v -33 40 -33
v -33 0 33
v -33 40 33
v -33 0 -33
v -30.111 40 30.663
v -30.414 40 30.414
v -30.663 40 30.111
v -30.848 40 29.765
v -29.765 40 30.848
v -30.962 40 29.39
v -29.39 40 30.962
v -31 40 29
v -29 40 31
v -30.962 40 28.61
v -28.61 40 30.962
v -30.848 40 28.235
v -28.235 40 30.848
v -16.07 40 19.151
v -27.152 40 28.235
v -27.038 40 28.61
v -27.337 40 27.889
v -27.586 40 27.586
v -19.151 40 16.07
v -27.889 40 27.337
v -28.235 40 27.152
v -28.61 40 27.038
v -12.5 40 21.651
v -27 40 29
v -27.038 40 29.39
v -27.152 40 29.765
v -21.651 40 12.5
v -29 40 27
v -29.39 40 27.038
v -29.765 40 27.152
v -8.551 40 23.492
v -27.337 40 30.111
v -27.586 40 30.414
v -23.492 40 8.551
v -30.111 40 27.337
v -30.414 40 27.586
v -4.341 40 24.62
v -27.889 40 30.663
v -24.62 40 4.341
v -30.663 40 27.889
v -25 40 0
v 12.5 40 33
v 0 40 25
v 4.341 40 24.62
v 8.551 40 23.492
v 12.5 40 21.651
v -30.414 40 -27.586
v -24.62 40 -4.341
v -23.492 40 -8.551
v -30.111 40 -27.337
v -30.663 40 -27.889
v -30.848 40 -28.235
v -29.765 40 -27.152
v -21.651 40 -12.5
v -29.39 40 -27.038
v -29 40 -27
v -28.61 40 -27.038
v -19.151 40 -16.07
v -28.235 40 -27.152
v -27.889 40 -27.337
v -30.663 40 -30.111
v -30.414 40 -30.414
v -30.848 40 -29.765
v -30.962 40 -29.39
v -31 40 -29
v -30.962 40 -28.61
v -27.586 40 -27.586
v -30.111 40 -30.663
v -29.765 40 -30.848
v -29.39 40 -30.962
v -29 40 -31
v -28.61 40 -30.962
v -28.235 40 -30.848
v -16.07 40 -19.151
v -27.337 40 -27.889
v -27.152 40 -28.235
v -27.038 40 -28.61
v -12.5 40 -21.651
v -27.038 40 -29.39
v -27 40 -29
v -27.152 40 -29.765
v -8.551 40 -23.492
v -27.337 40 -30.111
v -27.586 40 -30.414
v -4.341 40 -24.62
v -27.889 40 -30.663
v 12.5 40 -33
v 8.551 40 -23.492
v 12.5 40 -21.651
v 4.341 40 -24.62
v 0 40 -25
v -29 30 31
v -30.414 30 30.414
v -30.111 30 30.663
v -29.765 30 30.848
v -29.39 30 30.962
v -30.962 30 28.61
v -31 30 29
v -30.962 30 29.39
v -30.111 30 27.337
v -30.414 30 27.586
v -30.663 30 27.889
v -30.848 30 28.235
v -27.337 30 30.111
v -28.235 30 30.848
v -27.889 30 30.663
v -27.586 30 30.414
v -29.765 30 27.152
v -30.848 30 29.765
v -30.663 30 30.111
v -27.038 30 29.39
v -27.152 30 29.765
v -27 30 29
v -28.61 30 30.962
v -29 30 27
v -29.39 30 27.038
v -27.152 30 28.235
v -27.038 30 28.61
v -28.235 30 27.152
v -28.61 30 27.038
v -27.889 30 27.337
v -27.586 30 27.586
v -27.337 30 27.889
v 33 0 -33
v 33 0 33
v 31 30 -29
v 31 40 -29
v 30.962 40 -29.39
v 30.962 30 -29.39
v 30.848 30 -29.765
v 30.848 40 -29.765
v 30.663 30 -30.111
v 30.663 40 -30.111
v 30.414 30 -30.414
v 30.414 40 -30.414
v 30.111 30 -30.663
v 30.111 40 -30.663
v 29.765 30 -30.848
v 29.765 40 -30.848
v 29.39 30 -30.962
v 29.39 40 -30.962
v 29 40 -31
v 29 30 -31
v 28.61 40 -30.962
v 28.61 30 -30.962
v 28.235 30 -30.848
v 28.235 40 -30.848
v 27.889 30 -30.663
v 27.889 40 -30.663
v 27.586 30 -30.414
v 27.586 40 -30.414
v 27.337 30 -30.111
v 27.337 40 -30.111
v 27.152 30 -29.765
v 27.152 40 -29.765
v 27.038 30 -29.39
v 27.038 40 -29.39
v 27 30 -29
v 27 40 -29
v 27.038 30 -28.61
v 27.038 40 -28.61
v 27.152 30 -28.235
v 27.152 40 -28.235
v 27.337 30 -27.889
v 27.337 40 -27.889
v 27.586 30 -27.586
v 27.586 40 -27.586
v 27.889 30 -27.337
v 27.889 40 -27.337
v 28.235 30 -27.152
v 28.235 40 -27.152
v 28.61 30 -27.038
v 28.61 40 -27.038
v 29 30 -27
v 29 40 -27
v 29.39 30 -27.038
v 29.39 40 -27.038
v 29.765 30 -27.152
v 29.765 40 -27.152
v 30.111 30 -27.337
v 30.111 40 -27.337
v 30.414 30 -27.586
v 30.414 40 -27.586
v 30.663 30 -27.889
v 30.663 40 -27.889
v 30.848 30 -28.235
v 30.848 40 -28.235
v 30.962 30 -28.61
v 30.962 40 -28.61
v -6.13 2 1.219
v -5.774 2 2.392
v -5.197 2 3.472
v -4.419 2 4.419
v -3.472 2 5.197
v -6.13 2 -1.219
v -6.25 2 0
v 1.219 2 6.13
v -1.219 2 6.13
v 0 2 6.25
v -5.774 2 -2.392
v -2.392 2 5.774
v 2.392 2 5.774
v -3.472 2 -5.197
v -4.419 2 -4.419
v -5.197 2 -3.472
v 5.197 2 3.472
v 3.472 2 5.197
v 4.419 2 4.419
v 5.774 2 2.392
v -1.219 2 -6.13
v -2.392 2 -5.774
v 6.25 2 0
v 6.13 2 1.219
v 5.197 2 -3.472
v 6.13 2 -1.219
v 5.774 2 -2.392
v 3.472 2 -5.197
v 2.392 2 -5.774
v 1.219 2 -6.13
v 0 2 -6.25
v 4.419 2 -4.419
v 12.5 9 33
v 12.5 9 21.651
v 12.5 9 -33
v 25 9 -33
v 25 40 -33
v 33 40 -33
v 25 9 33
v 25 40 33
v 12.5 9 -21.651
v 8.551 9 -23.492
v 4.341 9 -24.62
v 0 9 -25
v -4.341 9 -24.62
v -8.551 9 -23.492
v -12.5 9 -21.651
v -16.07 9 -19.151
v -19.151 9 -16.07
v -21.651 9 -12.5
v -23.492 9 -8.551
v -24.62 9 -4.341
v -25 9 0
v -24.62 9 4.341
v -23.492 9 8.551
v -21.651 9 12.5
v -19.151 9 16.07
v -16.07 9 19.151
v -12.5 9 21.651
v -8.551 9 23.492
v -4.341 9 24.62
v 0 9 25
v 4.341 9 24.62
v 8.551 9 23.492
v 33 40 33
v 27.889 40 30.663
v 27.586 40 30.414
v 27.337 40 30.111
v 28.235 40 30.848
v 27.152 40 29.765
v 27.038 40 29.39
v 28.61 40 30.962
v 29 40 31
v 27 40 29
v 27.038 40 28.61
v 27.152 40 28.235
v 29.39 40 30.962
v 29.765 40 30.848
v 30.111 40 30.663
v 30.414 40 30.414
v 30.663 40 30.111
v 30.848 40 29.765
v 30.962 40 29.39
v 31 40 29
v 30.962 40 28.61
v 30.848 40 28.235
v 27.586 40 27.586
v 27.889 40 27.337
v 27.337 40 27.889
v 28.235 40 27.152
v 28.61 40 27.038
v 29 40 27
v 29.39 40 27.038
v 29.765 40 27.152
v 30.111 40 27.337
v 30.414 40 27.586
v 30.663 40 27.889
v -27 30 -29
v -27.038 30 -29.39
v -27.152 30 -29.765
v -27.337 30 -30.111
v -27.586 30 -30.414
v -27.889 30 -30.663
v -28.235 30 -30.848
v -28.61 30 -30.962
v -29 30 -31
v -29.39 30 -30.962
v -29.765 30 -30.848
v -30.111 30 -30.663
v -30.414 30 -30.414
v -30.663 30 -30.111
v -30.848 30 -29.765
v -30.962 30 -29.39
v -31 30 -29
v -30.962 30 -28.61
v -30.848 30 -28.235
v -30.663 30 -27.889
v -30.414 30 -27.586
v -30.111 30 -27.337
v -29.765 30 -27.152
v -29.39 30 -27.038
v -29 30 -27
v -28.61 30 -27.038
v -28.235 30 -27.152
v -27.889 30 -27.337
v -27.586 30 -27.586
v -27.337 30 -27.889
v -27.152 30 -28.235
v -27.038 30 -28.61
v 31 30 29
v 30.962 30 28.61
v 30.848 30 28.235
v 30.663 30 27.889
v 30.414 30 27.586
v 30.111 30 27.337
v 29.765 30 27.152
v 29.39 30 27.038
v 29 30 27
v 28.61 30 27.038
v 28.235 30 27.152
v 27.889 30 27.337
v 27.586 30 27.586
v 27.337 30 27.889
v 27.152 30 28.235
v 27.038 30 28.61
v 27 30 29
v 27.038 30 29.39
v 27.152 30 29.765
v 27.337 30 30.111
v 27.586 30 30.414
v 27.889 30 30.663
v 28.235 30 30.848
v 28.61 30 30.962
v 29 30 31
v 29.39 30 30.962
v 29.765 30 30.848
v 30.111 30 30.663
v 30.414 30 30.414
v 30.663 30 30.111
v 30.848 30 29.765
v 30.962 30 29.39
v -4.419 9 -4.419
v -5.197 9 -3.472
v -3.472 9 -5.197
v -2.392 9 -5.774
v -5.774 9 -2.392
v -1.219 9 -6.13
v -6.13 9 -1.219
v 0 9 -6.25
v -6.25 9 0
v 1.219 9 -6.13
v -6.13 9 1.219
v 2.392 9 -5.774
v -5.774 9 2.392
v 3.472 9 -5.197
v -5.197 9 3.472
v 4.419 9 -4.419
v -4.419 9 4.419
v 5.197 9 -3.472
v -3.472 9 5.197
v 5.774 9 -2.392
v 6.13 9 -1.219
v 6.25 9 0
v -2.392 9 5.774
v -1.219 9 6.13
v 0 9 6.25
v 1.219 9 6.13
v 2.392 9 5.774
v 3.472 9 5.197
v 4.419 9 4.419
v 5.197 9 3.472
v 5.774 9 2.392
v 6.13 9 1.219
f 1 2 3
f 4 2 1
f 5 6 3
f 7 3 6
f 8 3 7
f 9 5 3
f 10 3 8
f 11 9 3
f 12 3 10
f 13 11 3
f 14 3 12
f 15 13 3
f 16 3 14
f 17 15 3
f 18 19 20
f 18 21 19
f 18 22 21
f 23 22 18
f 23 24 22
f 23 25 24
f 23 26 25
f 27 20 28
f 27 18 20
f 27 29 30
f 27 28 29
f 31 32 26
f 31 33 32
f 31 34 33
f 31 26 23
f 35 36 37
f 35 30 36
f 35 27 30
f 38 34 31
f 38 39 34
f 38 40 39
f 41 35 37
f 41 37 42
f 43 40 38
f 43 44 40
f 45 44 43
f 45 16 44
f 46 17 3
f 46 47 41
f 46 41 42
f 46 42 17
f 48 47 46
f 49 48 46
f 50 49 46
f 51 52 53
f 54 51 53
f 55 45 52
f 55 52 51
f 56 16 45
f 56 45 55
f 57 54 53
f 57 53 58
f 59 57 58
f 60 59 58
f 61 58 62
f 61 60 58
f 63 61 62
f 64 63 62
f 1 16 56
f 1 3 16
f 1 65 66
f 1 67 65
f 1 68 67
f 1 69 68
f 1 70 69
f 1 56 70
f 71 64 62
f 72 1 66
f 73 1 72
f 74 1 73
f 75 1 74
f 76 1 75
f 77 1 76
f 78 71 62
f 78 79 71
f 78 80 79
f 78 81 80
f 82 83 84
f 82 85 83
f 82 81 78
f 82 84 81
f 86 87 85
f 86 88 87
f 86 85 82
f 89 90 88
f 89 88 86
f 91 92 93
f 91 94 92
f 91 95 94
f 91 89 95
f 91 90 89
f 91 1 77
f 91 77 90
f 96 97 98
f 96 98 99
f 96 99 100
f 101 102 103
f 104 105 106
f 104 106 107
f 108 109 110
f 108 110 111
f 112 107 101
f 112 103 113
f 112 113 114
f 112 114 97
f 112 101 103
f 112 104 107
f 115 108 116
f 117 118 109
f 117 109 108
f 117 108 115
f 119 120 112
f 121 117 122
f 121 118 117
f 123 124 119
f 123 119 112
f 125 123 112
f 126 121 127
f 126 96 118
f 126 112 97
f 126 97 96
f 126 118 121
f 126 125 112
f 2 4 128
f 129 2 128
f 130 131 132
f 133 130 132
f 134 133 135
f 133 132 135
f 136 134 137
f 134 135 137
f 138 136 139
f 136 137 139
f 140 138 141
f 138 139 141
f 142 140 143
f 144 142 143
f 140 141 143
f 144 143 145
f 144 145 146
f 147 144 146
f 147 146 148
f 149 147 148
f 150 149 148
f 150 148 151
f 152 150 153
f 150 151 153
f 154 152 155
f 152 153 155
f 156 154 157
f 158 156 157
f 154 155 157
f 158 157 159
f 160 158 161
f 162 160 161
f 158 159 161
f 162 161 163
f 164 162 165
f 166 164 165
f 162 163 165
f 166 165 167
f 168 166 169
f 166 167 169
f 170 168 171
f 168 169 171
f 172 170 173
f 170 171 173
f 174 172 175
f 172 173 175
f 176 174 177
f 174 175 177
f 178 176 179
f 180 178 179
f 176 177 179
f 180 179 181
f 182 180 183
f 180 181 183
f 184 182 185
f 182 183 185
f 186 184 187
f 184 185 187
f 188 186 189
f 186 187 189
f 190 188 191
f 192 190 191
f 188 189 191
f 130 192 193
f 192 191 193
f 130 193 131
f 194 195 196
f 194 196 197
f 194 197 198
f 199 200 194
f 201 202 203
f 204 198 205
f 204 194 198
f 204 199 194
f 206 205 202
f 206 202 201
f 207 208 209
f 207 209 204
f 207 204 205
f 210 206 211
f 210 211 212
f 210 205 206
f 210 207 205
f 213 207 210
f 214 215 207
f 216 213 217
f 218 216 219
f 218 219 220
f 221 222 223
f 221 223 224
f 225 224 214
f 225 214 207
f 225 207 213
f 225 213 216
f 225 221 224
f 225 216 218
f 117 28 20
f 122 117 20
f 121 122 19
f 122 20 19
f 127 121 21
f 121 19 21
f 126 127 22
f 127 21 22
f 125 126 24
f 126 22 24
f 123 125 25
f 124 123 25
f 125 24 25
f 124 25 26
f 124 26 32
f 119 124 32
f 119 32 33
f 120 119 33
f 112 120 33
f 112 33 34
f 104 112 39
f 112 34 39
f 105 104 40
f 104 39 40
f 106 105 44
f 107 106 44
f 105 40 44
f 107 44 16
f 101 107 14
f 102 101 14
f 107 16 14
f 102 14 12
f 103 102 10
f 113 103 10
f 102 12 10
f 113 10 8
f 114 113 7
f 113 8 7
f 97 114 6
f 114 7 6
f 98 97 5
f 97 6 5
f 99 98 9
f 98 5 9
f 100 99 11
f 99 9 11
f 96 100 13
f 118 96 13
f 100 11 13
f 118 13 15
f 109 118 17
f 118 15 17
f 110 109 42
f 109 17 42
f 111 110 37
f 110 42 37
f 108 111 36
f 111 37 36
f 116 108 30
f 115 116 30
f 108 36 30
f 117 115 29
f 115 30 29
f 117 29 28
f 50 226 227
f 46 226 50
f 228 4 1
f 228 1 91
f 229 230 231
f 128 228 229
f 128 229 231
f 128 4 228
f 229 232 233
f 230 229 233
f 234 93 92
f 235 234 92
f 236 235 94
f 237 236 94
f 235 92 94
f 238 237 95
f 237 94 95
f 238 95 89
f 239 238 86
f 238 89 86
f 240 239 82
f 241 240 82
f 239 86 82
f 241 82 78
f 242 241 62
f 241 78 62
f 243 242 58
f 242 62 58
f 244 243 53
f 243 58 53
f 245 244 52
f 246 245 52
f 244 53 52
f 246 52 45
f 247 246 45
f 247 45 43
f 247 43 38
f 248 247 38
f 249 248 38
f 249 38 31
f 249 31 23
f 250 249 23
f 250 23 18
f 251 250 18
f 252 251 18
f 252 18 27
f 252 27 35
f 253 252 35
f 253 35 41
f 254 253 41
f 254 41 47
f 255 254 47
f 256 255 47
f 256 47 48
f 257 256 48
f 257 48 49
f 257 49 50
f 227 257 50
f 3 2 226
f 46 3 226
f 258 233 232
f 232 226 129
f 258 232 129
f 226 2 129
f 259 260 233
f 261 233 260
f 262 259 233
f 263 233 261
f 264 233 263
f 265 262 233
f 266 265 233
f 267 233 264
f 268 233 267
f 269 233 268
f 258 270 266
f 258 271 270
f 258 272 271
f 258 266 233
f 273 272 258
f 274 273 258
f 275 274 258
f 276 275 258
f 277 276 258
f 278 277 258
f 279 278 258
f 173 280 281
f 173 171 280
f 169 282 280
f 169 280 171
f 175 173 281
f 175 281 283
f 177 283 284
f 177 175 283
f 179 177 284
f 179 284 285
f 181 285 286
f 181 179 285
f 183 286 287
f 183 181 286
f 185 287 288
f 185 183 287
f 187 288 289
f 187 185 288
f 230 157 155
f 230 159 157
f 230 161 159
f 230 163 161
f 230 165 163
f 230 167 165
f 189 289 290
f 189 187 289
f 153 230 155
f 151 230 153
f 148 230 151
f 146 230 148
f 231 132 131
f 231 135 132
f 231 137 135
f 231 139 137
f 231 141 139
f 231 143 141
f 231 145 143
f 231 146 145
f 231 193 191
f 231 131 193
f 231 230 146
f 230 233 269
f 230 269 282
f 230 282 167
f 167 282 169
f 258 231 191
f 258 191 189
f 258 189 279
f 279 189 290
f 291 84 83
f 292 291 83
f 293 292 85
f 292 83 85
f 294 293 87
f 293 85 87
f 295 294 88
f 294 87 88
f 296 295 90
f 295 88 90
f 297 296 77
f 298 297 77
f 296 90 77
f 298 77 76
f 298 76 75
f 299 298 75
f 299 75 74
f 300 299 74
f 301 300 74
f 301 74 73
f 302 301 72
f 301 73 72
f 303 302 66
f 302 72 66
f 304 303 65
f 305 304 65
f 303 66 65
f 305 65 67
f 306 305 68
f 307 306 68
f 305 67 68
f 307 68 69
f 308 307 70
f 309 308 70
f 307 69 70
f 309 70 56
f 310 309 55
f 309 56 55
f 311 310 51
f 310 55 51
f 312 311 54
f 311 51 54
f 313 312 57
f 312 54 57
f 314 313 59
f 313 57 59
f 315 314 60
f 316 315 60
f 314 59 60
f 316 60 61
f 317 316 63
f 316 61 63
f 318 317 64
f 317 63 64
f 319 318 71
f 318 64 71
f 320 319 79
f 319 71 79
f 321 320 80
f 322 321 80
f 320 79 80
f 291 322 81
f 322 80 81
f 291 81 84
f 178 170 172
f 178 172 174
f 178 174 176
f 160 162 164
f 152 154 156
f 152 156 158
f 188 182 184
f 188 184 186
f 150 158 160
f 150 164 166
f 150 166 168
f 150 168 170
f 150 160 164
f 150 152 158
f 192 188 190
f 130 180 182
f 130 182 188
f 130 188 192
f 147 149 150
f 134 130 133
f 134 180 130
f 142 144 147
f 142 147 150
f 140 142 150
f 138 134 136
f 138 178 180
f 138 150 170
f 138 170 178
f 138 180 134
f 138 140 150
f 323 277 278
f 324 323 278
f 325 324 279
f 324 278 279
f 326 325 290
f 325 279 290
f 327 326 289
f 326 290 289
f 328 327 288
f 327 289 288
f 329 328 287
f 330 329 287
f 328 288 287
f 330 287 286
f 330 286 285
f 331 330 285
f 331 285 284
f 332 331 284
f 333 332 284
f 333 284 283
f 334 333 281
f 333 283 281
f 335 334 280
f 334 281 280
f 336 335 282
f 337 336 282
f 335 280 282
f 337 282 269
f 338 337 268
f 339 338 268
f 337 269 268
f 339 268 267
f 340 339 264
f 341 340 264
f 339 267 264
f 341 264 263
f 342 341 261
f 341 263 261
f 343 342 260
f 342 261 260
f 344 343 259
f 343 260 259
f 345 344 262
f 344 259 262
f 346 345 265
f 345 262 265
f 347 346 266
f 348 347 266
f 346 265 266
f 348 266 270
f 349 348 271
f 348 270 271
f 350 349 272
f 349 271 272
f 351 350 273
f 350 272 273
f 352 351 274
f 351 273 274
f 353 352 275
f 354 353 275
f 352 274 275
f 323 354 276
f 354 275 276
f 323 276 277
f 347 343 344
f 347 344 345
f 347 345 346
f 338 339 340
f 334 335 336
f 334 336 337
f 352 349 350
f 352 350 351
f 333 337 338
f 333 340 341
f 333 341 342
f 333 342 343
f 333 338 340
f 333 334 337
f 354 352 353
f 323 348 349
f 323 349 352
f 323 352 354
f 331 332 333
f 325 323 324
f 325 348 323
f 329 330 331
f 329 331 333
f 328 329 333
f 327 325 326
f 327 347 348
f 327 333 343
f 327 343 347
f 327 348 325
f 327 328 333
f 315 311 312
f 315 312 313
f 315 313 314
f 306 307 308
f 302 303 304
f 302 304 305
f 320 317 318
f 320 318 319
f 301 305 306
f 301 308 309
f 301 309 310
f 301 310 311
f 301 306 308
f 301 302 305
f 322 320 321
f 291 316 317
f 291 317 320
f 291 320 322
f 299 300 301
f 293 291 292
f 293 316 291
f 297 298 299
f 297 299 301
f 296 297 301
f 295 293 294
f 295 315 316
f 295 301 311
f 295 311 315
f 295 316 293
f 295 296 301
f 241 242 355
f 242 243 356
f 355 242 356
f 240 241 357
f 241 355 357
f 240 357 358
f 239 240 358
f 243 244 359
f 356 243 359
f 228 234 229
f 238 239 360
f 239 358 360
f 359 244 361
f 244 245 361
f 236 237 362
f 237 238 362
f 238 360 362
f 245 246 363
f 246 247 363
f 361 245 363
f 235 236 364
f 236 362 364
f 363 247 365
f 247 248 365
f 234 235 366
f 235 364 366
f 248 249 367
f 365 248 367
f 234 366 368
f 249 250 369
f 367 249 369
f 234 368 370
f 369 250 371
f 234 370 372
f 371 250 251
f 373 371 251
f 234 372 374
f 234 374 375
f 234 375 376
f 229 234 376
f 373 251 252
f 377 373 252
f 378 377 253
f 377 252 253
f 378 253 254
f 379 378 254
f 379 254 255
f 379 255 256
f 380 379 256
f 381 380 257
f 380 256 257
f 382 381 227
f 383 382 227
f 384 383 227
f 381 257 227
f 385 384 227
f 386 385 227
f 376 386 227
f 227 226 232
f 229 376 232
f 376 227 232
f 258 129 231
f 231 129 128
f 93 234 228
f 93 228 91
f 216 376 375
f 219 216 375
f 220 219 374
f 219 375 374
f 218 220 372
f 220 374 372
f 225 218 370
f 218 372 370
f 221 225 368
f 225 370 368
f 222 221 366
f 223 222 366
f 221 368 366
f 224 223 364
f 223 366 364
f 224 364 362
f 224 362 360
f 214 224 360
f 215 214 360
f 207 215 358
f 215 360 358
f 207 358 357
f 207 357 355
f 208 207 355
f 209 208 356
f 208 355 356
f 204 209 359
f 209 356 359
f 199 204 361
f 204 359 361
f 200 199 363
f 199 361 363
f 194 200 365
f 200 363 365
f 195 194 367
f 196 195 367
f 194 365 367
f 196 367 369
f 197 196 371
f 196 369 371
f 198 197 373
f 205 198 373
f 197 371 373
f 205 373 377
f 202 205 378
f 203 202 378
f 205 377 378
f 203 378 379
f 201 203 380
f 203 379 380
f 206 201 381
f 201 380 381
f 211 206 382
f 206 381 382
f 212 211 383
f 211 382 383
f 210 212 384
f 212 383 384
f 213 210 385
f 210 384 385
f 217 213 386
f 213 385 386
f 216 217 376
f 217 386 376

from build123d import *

# Parameters (mm, degrees)
SKETCH1_W               = 66
SKETCH1_H               = 66
BOSS_EXTRUDE1_DEPTH     = 40
SKETCH2_R               = 25
CUT_EXTRUDE1_DEPTH      = 31
SKETCH3_R               = 6.25
CUT_EXTRUDE2_DEPTH      = 7
SKETCH4_W               = 12.5
SKETCH4_H               = 31
CUT_EXTRUDE3_DEPTH      = 1
CUT_EXTRUDE3_DEPTH_BACK = 67
SKETCH5_R               = 2
CUT_EXTRUDE4_DEPTH      = 10


with BuildPart() as part:
    # Sketch1 → Boss-Extrude1 (new body)
    with BuildSketch(Plane(origin=(0, 0, 0), x_dir=(1, 0, 0), z_dir=(0, 1, 0))):
        Rectangle(SKETCH1_W, SKETCH1_H)
    extrude(amount=BOSS_EXTRUDE1_DEPTH)

    # Sketch2 → Cut-Extrude1 (cut)
    with BuildSketch(Plane(origin=(0, 40, 0), x_dir=(1, 0, 0), z_dir=(0, 1, 0))):
        Circle(SKETCH2_R)
    extrude(amount=-CUT_EXTRUDE1_DEPTH, mode=Mode.SUBTRACT)

    # Sketch3 → Cut-Extrude2 (cut)
    with BuildSketch(Plane(origin=(0, 9, 0), x_dir=(1, 0, 0), z_dir=(0, 1, 0))):
        Circle(SKETCH3_R)
    extrude(amount=-CUT_EXTRUDE2_DEPTH, mode=Mode.SUBTRACT)

    # Sketch4 → Cut-Extrude3 (cut, two sides)
    with BuildSketch(Plane.XY.offset(33)) as cut_extrude3_sk:
        with Locations((18.75, 24.5)):
            Rectangle(SKETCH4_W, SKETCH4_H)
    extrude(amount=CUT_EXTRUDE3_DEPTH, mode=Mode.SUBTRACT)
    extrude(cut_extrude3_sk.sketch, amount=-CUT_EXTRUDE3_DEPTH_BACK, mode=Mode.SUBTRACT)

    # Sketch5 → Cut-Extrude4 (cut)
    with BuildSketch(Plane(origin=(0, 40, 0), x_dir=(1, 0, 0), z_dir=(0, 1, 0))):
        with Locations((-29, -29)):
            Circle(SKETCH5_R)
        with Locations((-29, 29)):
            Circle(SKETCH5_R)
        with Locations((29, 29)):
            Circle(SKETCH5_R)
        with Locations((29, -29)):
            Circle(SKETCH5_R)
    extrude(amount=-CUT_EXTRUDE4_DEPTH, mode=Mode.SUBTRACT)


solid = part.part
